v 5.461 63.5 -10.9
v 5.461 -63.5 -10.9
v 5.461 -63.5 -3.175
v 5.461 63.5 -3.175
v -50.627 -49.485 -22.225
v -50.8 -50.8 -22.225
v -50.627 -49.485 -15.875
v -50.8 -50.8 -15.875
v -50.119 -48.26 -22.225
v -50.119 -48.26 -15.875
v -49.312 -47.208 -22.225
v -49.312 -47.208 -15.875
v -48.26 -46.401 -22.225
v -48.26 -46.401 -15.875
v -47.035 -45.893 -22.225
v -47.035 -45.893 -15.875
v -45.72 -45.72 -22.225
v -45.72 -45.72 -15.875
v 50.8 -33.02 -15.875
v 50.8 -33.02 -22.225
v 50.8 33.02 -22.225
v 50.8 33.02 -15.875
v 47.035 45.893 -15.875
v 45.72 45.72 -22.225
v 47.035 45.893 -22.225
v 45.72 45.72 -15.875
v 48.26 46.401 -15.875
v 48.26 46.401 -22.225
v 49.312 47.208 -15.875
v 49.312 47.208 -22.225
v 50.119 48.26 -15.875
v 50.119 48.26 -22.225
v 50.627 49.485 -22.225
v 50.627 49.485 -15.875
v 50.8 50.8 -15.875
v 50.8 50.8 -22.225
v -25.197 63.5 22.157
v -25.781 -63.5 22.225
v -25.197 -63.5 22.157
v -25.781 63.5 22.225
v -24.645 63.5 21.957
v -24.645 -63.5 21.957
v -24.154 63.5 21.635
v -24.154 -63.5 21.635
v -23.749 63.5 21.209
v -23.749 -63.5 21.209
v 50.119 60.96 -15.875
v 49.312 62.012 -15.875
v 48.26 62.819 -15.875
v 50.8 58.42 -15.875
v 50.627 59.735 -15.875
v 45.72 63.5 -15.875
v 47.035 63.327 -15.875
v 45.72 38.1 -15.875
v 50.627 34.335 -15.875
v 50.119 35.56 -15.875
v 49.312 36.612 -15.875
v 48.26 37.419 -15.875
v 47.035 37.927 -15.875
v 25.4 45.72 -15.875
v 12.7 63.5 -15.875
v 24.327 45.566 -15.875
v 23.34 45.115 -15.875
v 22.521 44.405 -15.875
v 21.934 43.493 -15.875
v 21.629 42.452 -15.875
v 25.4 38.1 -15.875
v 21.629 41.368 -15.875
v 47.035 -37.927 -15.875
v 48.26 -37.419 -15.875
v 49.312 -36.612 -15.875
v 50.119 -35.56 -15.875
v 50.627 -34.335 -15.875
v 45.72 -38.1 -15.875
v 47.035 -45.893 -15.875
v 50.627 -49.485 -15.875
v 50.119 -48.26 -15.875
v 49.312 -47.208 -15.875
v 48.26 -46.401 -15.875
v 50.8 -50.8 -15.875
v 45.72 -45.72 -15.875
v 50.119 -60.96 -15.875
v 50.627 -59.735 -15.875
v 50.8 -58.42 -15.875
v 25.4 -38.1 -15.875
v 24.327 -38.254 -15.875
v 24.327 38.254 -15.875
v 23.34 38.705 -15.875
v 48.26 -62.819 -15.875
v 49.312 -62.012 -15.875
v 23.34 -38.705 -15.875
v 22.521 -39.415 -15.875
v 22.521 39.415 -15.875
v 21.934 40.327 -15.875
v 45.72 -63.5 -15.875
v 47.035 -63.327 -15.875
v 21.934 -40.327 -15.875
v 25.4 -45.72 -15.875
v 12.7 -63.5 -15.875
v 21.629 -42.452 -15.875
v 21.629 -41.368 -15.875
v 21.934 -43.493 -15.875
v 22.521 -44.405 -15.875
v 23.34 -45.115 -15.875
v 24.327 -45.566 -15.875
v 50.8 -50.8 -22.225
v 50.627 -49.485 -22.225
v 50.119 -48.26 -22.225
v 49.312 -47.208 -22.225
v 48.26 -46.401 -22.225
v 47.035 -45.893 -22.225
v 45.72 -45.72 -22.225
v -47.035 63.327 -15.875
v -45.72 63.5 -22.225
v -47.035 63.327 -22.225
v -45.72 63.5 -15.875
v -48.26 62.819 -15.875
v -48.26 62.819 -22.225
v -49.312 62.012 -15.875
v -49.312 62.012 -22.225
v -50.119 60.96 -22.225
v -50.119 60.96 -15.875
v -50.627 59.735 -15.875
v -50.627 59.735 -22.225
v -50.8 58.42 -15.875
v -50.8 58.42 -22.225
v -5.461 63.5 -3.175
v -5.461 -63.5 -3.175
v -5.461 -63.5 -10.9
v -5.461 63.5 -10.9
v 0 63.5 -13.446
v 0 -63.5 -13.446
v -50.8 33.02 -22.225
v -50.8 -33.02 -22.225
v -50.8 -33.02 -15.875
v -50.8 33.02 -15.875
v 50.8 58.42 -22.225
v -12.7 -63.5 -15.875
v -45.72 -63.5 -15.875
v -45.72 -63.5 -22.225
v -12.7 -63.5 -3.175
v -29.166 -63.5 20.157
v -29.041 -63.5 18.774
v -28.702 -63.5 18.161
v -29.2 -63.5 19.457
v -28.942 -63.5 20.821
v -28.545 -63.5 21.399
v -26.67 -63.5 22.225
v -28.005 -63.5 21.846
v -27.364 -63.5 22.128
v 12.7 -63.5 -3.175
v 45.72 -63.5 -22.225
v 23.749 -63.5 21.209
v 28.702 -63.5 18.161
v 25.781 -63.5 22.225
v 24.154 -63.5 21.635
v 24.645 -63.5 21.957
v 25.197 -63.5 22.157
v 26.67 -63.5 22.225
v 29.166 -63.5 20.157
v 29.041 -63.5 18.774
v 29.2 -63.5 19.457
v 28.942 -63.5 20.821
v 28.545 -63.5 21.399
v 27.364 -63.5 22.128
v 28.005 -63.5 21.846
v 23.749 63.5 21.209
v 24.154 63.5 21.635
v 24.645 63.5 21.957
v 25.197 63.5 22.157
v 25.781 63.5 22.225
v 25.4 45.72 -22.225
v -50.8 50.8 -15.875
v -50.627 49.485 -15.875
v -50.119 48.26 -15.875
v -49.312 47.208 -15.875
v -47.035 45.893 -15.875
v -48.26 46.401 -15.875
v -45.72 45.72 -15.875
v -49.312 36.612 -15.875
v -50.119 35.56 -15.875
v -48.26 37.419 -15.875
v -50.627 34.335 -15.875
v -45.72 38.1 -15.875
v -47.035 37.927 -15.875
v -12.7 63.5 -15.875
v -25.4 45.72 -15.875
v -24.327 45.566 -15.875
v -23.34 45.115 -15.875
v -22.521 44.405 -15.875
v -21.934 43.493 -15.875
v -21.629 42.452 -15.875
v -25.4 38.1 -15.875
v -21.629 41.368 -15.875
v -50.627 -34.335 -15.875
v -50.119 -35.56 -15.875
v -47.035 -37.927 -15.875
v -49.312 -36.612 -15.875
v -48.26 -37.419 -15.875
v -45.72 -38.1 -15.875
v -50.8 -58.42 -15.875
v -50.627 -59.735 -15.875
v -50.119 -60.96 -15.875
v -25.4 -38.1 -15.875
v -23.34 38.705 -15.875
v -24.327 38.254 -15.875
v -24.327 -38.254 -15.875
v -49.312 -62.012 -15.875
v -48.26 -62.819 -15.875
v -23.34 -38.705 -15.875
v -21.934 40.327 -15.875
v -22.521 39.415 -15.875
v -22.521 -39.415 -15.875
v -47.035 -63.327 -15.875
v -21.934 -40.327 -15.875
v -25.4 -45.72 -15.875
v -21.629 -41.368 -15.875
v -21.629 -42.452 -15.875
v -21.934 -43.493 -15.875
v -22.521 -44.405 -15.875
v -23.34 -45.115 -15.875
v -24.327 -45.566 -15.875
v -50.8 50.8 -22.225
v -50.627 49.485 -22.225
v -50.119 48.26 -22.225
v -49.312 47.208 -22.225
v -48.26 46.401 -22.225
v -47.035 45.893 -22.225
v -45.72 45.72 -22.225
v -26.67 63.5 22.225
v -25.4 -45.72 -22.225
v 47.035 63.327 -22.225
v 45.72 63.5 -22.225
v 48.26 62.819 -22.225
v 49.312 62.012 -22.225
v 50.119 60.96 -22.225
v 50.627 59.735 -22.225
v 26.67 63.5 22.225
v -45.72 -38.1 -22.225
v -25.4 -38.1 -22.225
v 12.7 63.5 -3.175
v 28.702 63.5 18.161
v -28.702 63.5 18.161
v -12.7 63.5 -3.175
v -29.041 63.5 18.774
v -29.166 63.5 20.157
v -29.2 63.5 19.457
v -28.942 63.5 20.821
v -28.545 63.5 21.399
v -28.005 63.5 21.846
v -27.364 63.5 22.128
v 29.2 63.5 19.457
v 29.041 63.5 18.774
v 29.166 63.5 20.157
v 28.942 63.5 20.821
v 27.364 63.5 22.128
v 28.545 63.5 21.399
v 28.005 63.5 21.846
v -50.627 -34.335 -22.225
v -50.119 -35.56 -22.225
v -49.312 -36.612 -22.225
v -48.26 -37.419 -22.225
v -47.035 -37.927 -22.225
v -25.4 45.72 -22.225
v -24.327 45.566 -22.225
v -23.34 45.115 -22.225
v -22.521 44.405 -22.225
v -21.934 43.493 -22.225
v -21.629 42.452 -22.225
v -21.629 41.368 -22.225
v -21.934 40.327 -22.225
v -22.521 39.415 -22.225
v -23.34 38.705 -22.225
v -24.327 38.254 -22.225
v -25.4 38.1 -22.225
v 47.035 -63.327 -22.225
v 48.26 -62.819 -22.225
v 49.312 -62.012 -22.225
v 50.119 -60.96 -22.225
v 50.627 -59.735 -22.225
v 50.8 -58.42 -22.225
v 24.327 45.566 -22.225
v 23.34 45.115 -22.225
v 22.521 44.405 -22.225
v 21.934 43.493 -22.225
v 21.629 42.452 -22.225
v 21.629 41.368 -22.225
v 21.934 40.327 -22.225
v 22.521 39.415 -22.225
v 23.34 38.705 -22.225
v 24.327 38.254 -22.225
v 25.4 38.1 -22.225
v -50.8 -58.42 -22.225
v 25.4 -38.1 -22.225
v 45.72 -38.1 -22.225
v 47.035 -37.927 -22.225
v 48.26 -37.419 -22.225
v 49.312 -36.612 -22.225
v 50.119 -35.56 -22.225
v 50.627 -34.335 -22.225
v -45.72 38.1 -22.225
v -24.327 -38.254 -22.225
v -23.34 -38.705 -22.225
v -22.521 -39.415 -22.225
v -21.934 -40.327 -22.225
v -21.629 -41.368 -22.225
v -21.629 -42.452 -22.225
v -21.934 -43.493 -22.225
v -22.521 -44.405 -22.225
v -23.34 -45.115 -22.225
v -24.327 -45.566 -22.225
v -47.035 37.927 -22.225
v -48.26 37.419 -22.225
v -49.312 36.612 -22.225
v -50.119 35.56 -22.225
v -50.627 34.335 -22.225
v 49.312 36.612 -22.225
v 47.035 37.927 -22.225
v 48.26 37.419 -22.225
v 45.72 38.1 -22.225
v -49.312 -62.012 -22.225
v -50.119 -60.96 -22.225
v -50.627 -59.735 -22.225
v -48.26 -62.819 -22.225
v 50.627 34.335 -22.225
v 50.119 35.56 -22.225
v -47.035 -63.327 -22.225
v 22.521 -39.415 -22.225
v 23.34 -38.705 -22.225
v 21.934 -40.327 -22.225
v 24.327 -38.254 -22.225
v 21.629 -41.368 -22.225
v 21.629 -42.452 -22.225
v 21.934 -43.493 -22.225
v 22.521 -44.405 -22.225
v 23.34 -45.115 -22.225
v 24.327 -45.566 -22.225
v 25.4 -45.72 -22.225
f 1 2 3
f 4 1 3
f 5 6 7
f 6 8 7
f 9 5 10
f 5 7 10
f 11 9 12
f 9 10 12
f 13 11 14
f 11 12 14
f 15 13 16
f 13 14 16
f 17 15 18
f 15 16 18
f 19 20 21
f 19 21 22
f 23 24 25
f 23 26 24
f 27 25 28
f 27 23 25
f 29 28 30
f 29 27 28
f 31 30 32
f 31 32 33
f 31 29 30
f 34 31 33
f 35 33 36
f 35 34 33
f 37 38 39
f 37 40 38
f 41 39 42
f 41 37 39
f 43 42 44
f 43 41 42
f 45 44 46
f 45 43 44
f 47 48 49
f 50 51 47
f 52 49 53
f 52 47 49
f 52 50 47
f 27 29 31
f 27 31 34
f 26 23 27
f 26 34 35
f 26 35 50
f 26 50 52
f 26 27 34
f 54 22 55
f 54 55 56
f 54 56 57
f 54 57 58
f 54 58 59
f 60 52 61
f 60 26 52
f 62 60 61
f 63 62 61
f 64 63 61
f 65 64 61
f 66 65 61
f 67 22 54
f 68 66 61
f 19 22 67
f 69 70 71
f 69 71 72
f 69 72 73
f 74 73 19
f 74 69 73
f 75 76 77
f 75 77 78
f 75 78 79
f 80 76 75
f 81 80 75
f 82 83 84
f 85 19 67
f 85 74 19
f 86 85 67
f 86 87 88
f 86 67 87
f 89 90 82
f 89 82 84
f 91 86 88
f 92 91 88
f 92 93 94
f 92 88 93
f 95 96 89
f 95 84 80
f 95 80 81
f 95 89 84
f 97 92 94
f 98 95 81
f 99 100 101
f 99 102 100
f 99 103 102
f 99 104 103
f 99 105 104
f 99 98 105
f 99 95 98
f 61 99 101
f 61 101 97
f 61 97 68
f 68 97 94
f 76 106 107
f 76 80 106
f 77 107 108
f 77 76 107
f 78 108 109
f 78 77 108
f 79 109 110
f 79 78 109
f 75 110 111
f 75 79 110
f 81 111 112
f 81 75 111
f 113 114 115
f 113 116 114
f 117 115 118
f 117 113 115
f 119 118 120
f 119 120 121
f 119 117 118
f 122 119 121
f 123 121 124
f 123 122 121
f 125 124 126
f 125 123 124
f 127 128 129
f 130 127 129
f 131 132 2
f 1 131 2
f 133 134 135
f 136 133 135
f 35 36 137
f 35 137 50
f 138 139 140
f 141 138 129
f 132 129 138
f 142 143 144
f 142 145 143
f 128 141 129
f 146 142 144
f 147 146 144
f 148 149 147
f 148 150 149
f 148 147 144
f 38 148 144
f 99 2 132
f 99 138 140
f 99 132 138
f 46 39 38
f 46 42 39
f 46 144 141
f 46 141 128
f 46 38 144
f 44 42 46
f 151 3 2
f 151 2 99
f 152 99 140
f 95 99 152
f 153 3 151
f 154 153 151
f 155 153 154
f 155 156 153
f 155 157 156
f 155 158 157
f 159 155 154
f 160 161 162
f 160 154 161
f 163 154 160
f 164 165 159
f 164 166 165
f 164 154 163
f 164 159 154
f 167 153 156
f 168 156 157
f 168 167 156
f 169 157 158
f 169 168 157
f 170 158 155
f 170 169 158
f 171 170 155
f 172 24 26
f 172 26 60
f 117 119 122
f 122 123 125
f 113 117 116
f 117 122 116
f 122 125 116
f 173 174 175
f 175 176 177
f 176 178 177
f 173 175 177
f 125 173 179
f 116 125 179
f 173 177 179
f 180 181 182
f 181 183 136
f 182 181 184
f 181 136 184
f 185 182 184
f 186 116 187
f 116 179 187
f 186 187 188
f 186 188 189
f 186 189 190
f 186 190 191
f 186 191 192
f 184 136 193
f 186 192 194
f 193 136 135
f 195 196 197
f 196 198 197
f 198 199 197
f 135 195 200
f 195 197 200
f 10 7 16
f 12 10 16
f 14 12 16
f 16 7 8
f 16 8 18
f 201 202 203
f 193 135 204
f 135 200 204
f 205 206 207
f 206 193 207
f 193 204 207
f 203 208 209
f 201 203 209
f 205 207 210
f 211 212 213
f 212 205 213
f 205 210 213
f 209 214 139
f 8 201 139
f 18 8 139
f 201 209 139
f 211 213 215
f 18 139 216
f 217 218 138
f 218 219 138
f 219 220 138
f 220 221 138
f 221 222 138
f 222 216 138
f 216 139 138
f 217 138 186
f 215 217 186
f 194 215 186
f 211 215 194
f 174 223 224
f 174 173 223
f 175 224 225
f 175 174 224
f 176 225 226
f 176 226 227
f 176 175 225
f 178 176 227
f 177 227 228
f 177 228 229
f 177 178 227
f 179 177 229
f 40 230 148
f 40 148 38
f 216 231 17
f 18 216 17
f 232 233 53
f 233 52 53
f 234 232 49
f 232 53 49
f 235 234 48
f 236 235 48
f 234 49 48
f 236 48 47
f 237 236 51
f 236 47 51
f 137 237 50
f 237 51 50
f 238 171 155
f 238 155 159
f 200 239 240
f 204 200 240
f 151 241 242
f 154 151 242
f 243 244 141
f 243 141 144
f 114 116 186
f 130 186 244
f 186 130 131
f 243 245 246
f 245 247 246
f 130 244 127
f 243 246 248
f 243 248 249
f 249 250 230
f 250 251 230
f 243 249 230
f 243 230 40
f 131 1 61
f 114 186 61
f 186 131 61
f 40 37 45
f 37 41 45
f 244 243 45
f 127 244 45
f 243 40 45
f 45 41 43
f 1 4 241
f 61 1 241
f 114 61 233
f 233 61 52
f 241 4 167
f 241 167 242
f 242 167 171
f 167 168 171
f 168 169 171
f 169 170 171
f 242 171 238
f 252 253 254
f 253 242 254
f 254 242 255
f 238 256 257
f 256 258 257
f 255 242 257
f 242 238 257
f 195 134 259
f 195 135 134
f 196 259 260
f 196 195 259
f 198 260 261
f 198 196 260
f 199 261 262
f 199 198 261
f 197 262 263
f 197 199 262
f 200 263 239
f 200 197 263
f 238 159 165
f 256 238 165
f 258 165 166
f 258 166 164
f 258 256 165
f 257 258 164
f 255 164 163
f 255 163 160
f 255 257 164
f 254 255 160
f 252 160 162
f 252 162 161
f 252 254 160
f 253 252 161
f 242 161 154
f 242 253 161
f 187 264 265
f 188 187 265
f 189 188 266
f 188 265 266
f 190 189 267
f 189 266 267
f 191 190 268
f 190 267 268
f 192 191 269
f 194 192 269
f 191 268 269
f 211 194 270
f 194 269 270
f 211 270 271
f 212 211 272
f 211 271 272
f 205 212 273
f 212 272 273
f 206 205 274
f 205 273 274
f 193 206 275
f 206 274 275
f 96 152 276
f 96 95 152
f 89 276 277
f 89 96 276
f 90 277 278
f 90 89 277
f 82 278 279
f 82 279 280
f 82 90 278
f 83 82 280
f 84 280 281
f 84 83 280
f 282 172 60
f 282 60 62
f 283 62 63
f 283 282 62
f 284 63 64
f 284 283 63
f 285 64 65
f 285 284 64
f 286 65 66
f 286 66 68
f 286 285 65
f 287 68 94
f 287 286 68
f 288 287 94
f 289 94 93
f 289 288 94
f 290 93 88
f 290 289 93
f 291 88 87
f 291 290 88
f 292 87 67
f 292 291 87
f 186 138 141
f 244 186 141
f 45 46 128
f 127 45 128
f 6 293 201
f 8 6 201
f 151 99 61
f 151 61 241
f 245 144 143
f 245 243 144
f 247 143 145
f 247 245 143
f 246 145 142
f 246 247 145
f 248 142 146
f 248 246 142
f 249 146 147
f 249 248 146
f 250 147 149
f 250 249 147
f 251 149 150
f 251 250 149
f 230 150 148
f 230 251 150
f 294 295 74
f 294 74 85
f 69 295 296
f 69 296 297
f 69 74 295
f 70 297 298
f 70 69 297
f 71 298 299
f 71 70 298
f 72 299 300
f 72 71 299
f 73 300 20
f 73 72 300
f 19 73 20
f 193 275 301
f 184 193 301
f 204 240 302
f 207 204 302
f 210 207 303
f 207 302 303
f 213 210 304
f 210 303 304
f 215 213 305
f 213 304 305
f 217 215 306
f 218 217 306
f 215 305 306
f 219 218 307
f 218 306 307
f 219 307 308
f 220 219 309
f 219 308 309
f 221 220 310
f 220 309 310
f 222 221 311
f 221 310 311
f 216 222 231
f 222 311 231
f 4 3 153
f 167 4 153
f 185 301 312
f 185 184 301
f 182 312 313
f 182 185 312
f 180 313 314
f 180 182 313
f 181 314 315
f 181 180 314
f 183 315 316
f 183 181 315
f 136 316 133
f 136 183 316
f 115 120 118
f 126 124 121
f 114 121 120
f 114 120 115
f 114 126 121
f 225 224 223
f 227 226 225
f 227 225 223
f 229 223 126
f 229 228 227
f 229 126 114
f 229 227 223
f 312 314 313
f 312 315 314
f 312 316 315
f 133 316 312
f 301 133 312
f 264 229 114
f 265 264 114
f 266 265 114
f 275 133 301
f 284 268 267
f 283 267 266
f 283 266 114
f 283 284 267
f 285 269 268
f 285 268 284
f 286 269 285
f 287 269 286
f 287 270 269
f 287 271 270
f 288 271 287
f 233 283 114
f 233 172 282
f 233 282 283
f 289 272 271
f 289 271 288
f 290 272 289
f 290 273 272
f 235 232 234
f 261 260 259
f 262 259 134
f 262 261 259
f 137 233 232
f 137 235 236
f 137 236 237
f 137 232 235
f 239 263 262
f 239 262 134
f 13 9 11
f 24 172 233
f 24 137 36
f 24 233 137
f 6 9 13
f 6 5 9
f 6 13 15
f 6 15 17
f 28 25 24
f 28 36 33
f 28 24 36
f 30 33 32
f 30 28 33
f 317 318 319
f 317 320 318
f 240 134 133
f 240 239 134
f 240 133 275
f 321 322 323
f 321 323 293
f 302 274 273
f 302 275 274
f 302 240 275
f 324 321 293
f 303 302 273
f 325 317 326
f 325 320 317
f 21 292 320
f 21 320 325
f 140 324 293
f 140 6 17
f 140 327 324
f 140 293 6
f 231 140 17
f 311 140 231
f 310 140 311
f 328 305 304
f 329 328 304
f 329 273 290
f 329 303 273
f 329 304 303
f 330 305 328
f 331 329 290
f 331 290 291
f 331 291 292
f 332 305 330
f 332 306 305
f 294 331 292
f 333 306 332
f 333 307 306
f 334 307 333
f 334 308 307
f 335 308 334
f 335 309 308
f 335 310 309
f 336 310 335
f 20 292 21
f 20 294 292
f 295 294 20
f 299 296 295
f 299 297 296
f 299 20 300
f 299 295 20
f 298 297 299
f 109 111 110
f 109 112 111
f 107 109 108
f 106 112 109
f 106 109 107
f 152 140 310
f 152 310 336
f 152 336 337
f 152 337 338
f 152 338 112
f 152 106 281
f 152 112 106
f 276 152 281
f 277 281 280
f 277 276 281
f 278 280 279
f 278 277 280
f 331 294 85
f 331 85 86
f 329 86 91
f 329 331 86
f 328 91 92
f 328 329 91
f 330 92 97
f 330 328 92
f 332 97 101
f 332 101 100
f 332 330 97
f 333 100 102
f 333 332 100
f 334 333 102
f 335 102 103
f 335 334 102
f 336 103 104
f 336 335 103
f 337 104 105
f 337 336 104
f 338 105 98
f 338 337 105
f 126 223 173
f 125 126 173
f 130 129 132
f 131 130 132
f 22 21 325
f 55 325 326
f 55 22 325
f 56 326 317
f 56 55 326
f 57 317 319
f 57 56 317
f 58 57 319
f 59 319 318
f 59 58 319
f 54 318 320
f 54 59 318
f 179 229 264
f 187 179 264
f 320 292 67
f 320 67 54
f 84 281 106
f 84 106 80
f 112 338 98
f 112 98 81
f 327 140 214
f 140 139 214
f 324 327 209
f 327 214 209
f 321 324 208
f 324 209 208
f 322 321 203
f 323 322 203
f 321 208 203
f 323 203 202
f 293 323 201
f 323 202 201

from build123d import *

# Parameters (mm, degrees)
F0_W     = 101.6
F0_H     = 44.45
F1_DEPTH = 63.5
F3_DEPTH = 127.001
F5_DEPTH = 127.001
F6_R     = 2.54
F8_DEPTH = 6.35
F9_R     = 5.08


# Not quite as in the source:
# - a pattern or mirror of a feature is missing from the dataset's text; its kind, count and spacing are read off the source's solid


with BuildPart() as f1:
    # F0 (on Front) → F1 (new body, symmetric)
    with BuildSketch(Plane.XZ):
        Rectangle(F0_W, F0_H)
    extrude(amount=F1_DEPTH, both=True)

    # F2 (on face) → F3 (cut, through all)
    with BuildSketch(Plane.XZ.offset(63.5)):
        Polygon((-50.8, -15.875), (-12.7, -15.875), (-12.7, -3.175), (-31.75, 22.225), (-50.8, 22.225), align=None)
    f3 = extrude(amount=-F3_DEPTH, mode=Mode.SUBTRACT)

    # F3_copies: F3 across plane
    add(f3.mirror(Plane(origin=(0, 0, 0), x_dir=(0, 0, 1), z_dir=(1, 0, 0))), mode=Mode.SUBTRACT)

    # F4 (on face) → F5 (cut, through all)
    with BuildSketch(Plane.XZ.offset(63.5)):
        Polygon((24.511, 22.225), (-24.511, 22.225), (-5.461, -3.175), (-5.461, -10.8996083293), (0, -13.4461144505), (5.461, -10.8996083293), (5.461, -3.175), align=None)
    extrude(amount=-F5_DEPTH, mode=Mode.SUBTRACT)

    # F6
    f6_edges = [f1.edges().sort_by_distance(p)[0] for p in [
        (-31.75, 0, 22.225),
        (-24.511, 0, 22.225),
        (24.511, 0, 22.225),
        (31.75, 0, 22.225),
    ]]
    fillet(f6_edges, radius=F6_R)

    # F7 (on face) → F8 (cut, through all)
    with BuildSketch(Plane(origin=(0, 0, -22.225), x_dir=(1, 0, 0), z_dir=(0, 0, -1))):
        with BuildLine():
            Line((-25.4, 45.72), (-50.8, 45.72))
            Line((-50.8, 45.72), (-50.8, 38.1))
            Line((-50.8, 38.1), (-25.4, 38.1))
            ThreePointArc((-25.4, 38.1), (-21.59, 41.91), (-25.4, 45.72))
        make_face()
        with BuildLine():
            Line((-25.4, -38.1), (-50.8, -38.1))
            Line((-50.8, -38.1), (-50.8, -45.72))
            Line((-50.8, -45.72), (-25.4, -45.72))
            ThreePointArc((-25.4, -45.72), (-21.59, -41.91), (-25.4, -38.1))
        make_face()
    f8 = extrude(amount=-F8_DEPTH, mode=Mode.SUBTRACT)

    # F8_copies: F8 across plane
    add(f8.mirror(Plane(origin=(0, 0, 0), x_dir=(0, 0, 1), z_dir=(1, 0, 0))), mode=Mode.SUBTRACT)

    # F9
    f9_edges = [f1.edges().sort_by_distance(p)[0] for p in [
        (-50.8, -63.5, -19.05),
        (-50.8, 63.5, -19.05),
        (50.8, -63.5, -19.05),
        (50.8, 63.5, -19.05),
        (-50.8, -45.72, -19.05),
        (-50.8, 38.1, -19.05),
        (-50.8, 45.72, -19.05),
        (-50.8, -38.1, -19.05),
        (50.8, 45.72, -19.05),
        (50.8, -45.72, -19.05),
        (50.8, -38.1, -19.05),
        (50.8, 38.1, -19.05),
    ]]
    fillet(f9_edges, radius=F9_R)


solid = f1.part
